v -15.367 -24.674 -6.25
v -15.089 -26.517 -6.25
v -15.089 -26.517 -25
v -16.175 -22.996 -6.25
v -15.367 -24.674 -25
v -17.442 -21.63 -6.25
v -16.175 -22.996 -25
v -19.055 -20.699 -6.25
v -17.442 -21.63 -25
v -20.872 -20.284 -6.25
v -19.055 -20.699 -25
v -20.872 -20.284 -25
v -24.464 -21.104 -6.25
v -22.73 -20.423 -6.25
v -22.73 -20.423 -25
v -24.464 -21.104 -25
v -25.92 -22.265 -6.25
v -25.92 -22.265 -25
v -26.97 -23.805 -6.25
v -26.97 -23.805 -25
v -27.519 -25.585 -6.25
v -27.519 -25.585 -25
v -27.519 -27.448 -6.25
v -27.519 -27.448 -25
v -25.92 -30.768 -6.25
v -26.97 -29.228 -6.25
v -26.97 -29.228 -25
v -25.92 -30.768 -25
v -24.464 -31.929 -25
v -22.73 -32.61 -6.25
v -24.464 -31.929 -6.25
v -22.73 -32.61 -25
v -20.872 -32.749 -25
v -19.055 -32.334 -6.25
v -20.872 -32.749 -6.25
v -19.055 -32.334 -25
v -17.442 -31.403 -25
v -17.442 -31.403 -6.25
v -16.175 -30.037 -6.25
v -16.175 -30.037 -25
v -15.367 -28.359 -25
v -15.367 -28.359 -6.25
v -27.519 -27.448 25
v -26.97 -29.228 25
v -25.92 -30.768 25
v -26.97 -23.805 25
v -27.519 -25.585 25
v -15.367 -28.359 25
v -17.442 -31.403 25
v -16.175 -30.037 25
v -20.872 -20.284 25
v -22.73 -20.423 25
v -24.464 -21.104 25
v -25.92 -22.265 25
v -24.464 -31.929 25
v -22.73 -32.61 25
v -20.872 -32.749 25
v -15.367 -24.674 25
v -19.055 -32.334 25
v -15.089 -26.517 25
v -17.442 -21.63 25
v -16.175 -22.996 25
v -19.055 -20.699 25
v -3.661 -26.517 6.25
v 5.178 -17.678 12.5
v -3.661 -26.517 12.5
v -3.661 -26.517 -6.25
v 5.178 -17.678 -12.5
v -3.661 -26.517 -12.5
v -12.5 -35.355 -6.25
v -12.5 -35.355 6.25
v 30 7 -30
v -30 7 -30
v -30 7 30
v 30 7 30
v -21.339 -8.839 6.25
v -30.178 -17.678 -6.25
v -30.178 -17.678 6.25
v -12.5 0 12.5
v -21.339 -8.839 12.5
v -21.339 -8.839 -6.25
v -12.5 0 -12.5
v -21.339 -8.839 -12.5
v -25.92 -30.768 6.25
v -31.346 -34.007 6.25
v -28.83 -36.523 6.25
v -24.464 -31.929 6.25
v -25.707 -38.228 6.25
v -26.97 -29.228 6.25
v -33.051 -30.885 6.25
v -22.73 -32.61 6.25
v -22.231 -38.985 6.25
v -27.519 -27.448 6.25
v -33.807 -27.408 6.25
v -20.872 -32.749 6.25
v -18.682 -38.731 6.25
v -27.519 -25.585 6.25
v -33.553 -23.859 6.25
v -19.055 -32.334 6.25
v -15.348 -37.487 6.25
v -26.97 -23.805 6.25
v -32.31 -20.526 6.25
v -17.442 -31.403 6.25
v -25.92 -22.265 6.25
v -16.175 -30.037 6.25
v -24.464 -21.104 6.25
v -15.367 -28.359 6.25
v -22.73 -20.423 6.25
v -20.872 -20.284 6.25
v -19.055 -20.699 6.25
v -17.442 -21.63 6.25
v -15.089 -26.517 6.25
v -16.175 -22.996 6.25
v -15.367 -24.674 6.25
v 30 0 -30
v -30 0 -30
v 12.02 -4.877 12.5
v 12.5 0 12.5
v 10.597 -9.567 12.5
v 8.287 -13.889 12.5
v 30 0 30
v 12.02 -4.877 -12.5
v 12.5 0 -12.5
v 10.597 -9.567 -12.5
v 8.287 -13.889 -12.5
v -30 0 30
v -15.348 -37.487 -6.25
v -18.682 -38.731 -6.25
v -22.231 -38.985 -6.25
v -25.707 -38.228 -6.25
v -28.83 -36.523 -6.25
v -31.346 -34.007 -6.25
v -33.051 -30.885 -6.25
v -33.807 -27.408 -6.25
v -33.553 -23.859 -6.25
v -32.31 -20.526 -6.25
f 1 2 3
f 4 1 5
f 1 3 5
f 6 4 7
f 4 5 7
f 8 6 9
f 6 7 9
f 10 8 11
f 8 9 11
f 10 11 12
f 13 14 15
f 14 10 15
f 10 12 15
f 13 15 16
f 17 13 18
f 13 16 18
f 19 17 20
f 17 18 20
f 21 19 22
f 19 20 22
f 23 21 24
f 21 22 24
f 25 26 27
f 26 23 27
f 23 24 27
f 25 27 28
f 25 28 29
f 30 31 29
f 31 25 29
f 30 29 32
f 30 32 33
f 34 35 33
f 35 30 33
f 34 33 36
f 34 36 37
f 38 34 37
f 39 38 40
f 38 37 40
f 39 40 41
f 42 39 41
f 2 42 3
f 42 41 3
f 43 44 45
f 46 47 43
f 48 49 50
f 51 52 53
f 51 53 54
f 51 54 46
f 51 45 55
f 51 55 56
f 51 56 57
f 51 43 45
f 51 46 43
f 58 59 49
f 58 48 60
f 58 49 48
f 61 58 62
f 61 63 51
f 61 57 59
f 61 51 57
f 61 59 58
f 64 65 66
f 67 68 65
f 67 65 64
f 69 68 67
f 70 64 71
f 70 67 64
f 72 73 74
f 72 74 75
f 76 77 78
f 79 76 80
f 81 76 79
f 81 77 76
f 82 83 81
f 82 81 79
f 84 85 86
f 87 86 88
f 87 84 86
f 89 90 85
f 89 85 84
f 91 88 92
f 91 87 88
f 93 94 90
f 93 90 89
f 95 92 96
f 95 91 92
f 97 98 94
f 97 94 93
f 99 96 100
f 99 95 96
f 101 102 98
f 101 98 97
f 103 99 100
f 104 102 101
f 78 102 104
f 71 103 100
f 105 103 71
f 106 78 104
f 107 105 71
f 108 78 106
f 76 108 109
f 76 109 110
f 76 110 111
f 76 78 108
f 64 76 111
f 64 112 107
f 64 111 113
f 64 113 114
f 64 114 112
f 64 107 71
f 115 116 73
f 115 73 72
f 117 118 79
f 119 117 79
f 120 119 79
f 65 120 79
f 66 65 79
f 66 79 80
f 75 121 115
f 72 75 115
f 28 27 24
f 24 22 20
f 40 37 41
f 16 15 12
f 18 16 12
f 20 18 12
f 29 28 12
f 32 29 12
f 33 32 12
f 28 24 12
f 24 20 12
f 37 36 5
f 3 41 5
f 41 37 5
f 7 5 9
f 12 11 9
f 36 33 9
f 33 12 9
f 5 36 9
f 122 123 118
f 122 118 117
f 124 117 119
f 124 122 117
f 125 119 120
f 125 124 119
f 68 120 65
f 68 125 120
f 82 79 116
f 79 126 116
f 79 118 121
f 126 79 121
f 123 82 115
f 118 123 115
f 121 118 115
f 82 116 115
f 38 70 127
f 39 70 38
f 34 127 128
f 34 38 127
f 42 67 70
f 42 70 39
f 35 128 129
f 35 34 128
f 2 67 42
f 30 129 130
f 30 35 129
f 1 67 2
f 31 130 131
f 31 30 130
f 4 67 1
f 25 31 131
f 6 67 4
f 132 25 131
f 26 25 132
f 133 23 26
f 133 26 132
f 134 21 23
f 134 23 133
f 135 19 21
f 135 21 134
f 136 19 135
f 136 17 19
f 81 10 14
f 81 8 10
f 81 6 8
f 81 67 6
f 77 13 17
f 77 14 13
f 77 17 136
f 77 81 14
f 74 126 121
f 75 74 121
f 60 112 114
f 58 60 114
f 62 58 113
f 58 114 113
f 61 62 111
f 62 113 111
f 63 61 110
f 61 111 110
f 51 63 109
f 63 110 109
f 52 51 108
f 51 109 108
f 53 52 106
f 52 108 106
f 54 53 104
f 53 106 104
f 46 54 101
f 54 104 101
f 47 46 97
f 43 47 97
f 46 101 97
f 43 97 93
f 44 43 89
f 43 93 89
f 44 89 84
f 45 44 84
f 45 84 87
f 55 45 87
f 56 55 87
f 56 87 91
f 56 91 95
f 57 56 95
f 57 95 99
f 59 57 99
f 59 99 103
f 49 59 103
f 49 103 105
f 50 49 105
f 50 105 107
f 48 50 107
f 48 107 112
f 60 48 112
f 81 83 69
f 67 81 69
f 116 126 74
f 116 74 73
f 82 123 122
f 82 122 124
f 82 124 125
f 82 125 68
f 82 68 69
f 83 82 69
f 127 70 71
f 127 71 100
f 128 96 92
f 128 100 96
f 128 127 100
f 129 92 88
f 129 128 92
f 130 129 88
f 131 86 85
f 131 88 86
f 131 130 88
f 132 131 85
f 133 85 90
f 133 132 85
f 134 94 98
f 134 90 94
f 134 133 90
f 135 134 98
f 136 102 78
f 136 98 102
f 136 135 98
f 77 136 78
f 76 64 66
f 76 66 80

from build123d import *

# Parameters (mm, degrees)
SKETCH_1_W           = 60
SKETCH_1_H           = 60
EXTRUDE_1_DEPTH      = 7
EXTRUDE_2_DEPTH      = 12.5
EXTRUDE_2_DEPTH_BACK = 12.5
CUT_EXTRUDE_START    = -12.5
CUT_EXTRUDE_1_DEPTH  = 6.25
CUT_EXTRUDE_START_2  = 6.25
CUT_EXTRUDE_2_DEPTH  = 6.25
EXTRUDE_3_DEPTH      = 25
EXTRUDE_3_DEPTH_BACK = 25
SKETCH_5_R           = 6.25


with BuildPart() as part:
    # 草图1 → 凸台-拉伸1 (new body)
    with BuildSketch(Plane(origin=(0, 0, 0), x_dir=(1, 0, 0), z_dir=(0, 1, 0))):
        Rectangle(SKETCH_1_W, SKETCH_1_H)
    extrude(amount=EXTRUDE_1_DEPTH)

    # 草图2 → 凸台-拉伸2 (add, two sides: drawn at the far end of the back side and taken through both)
    with BuildSketch(Plane.XY.offset(-EXTRUDE_2_DEPTH_BACK)):
        with BuildLine():
            Line((-12.5, 0), (12.5, 0))
            ThreePointArc((12.5, 0), (10.596988313, -9.567085809), (5.17766953, -17.67766953))
            Line((5.17766953, -17.67766953), (-12.5, -35.355339059))
            ThreePointArc((-12.5, -35.355339059), (-30.17766953, -35.355339059), (-30.17766953, -17.67766953))
            Line((-30.17766953, -17.67766953), (-12.5, 0))
        make_face()
    extrude(amount=EXTRUDE_2_DEPTH + EXTRUDE_2_DEPTH_BACK)

    # 草图3 → 切除-拉伸1 (cut)
    with BuildSketch(Plane.XY.offset(CUT_EXTRUDE_START)):
        with BuildLine():
            Line((-21.338834765, -8.838834765), (-3.661165235, -26.516504294))
            Line((-3.661165235, -26.516504294), (-12.5, -35.355339059))
            ThreePointArc((-12.5, -35.355339059), (-30.17766953, -35.355339059), (-30.17766953, -17.67766953))
            Line((-30.17766953, -17.67766953), (-21.338834765, -8.838834765))
        make_face()
    extrude(amount=CUT_EXTRUDE_1_DEPTH, mode=Mode.SUBTRACT)

    # 草图4 → 切除-拉伸2 (cut)
    with BuildSketch(Plane.XY.offset(CUT_EXTRUDE_START_2)):
        with BuildLine():
            Line((-3.661165235, -26.516504294), (-21.338834765, -8.838834765))
            Line((-21.338834765, -8.838834765), (-30.17766953, -17.67766953))
            ThreePointArc((-30.17766953, -17.67766953), (-30.17766953, -35.355339059), (-12.5, -35.355339059))
            Line((-12.5, -35.355339059), (-3.661165235, -26.516504294))
        make_face()
    extrude(amount=CUT_EXTRUDE_2_DEPTH, mode=Mode.SUBTRACT)

    # 草图5 → 凸台-拉伸3 (add, two sides: drawn at the far end of the back side and taken through both)
    with BuildSketch(Plane.XY.offset(-EXTRUDE_3_DEPTH_BACK)):
        with Locations((-21.338834765, -26.516504294)):
            Circle(SKETCH_5_R)
    extrude(amount=EXTRUDE_3_DEPTH + EXTRUDE_3_DEPTH_BACK)


solid = part.part
